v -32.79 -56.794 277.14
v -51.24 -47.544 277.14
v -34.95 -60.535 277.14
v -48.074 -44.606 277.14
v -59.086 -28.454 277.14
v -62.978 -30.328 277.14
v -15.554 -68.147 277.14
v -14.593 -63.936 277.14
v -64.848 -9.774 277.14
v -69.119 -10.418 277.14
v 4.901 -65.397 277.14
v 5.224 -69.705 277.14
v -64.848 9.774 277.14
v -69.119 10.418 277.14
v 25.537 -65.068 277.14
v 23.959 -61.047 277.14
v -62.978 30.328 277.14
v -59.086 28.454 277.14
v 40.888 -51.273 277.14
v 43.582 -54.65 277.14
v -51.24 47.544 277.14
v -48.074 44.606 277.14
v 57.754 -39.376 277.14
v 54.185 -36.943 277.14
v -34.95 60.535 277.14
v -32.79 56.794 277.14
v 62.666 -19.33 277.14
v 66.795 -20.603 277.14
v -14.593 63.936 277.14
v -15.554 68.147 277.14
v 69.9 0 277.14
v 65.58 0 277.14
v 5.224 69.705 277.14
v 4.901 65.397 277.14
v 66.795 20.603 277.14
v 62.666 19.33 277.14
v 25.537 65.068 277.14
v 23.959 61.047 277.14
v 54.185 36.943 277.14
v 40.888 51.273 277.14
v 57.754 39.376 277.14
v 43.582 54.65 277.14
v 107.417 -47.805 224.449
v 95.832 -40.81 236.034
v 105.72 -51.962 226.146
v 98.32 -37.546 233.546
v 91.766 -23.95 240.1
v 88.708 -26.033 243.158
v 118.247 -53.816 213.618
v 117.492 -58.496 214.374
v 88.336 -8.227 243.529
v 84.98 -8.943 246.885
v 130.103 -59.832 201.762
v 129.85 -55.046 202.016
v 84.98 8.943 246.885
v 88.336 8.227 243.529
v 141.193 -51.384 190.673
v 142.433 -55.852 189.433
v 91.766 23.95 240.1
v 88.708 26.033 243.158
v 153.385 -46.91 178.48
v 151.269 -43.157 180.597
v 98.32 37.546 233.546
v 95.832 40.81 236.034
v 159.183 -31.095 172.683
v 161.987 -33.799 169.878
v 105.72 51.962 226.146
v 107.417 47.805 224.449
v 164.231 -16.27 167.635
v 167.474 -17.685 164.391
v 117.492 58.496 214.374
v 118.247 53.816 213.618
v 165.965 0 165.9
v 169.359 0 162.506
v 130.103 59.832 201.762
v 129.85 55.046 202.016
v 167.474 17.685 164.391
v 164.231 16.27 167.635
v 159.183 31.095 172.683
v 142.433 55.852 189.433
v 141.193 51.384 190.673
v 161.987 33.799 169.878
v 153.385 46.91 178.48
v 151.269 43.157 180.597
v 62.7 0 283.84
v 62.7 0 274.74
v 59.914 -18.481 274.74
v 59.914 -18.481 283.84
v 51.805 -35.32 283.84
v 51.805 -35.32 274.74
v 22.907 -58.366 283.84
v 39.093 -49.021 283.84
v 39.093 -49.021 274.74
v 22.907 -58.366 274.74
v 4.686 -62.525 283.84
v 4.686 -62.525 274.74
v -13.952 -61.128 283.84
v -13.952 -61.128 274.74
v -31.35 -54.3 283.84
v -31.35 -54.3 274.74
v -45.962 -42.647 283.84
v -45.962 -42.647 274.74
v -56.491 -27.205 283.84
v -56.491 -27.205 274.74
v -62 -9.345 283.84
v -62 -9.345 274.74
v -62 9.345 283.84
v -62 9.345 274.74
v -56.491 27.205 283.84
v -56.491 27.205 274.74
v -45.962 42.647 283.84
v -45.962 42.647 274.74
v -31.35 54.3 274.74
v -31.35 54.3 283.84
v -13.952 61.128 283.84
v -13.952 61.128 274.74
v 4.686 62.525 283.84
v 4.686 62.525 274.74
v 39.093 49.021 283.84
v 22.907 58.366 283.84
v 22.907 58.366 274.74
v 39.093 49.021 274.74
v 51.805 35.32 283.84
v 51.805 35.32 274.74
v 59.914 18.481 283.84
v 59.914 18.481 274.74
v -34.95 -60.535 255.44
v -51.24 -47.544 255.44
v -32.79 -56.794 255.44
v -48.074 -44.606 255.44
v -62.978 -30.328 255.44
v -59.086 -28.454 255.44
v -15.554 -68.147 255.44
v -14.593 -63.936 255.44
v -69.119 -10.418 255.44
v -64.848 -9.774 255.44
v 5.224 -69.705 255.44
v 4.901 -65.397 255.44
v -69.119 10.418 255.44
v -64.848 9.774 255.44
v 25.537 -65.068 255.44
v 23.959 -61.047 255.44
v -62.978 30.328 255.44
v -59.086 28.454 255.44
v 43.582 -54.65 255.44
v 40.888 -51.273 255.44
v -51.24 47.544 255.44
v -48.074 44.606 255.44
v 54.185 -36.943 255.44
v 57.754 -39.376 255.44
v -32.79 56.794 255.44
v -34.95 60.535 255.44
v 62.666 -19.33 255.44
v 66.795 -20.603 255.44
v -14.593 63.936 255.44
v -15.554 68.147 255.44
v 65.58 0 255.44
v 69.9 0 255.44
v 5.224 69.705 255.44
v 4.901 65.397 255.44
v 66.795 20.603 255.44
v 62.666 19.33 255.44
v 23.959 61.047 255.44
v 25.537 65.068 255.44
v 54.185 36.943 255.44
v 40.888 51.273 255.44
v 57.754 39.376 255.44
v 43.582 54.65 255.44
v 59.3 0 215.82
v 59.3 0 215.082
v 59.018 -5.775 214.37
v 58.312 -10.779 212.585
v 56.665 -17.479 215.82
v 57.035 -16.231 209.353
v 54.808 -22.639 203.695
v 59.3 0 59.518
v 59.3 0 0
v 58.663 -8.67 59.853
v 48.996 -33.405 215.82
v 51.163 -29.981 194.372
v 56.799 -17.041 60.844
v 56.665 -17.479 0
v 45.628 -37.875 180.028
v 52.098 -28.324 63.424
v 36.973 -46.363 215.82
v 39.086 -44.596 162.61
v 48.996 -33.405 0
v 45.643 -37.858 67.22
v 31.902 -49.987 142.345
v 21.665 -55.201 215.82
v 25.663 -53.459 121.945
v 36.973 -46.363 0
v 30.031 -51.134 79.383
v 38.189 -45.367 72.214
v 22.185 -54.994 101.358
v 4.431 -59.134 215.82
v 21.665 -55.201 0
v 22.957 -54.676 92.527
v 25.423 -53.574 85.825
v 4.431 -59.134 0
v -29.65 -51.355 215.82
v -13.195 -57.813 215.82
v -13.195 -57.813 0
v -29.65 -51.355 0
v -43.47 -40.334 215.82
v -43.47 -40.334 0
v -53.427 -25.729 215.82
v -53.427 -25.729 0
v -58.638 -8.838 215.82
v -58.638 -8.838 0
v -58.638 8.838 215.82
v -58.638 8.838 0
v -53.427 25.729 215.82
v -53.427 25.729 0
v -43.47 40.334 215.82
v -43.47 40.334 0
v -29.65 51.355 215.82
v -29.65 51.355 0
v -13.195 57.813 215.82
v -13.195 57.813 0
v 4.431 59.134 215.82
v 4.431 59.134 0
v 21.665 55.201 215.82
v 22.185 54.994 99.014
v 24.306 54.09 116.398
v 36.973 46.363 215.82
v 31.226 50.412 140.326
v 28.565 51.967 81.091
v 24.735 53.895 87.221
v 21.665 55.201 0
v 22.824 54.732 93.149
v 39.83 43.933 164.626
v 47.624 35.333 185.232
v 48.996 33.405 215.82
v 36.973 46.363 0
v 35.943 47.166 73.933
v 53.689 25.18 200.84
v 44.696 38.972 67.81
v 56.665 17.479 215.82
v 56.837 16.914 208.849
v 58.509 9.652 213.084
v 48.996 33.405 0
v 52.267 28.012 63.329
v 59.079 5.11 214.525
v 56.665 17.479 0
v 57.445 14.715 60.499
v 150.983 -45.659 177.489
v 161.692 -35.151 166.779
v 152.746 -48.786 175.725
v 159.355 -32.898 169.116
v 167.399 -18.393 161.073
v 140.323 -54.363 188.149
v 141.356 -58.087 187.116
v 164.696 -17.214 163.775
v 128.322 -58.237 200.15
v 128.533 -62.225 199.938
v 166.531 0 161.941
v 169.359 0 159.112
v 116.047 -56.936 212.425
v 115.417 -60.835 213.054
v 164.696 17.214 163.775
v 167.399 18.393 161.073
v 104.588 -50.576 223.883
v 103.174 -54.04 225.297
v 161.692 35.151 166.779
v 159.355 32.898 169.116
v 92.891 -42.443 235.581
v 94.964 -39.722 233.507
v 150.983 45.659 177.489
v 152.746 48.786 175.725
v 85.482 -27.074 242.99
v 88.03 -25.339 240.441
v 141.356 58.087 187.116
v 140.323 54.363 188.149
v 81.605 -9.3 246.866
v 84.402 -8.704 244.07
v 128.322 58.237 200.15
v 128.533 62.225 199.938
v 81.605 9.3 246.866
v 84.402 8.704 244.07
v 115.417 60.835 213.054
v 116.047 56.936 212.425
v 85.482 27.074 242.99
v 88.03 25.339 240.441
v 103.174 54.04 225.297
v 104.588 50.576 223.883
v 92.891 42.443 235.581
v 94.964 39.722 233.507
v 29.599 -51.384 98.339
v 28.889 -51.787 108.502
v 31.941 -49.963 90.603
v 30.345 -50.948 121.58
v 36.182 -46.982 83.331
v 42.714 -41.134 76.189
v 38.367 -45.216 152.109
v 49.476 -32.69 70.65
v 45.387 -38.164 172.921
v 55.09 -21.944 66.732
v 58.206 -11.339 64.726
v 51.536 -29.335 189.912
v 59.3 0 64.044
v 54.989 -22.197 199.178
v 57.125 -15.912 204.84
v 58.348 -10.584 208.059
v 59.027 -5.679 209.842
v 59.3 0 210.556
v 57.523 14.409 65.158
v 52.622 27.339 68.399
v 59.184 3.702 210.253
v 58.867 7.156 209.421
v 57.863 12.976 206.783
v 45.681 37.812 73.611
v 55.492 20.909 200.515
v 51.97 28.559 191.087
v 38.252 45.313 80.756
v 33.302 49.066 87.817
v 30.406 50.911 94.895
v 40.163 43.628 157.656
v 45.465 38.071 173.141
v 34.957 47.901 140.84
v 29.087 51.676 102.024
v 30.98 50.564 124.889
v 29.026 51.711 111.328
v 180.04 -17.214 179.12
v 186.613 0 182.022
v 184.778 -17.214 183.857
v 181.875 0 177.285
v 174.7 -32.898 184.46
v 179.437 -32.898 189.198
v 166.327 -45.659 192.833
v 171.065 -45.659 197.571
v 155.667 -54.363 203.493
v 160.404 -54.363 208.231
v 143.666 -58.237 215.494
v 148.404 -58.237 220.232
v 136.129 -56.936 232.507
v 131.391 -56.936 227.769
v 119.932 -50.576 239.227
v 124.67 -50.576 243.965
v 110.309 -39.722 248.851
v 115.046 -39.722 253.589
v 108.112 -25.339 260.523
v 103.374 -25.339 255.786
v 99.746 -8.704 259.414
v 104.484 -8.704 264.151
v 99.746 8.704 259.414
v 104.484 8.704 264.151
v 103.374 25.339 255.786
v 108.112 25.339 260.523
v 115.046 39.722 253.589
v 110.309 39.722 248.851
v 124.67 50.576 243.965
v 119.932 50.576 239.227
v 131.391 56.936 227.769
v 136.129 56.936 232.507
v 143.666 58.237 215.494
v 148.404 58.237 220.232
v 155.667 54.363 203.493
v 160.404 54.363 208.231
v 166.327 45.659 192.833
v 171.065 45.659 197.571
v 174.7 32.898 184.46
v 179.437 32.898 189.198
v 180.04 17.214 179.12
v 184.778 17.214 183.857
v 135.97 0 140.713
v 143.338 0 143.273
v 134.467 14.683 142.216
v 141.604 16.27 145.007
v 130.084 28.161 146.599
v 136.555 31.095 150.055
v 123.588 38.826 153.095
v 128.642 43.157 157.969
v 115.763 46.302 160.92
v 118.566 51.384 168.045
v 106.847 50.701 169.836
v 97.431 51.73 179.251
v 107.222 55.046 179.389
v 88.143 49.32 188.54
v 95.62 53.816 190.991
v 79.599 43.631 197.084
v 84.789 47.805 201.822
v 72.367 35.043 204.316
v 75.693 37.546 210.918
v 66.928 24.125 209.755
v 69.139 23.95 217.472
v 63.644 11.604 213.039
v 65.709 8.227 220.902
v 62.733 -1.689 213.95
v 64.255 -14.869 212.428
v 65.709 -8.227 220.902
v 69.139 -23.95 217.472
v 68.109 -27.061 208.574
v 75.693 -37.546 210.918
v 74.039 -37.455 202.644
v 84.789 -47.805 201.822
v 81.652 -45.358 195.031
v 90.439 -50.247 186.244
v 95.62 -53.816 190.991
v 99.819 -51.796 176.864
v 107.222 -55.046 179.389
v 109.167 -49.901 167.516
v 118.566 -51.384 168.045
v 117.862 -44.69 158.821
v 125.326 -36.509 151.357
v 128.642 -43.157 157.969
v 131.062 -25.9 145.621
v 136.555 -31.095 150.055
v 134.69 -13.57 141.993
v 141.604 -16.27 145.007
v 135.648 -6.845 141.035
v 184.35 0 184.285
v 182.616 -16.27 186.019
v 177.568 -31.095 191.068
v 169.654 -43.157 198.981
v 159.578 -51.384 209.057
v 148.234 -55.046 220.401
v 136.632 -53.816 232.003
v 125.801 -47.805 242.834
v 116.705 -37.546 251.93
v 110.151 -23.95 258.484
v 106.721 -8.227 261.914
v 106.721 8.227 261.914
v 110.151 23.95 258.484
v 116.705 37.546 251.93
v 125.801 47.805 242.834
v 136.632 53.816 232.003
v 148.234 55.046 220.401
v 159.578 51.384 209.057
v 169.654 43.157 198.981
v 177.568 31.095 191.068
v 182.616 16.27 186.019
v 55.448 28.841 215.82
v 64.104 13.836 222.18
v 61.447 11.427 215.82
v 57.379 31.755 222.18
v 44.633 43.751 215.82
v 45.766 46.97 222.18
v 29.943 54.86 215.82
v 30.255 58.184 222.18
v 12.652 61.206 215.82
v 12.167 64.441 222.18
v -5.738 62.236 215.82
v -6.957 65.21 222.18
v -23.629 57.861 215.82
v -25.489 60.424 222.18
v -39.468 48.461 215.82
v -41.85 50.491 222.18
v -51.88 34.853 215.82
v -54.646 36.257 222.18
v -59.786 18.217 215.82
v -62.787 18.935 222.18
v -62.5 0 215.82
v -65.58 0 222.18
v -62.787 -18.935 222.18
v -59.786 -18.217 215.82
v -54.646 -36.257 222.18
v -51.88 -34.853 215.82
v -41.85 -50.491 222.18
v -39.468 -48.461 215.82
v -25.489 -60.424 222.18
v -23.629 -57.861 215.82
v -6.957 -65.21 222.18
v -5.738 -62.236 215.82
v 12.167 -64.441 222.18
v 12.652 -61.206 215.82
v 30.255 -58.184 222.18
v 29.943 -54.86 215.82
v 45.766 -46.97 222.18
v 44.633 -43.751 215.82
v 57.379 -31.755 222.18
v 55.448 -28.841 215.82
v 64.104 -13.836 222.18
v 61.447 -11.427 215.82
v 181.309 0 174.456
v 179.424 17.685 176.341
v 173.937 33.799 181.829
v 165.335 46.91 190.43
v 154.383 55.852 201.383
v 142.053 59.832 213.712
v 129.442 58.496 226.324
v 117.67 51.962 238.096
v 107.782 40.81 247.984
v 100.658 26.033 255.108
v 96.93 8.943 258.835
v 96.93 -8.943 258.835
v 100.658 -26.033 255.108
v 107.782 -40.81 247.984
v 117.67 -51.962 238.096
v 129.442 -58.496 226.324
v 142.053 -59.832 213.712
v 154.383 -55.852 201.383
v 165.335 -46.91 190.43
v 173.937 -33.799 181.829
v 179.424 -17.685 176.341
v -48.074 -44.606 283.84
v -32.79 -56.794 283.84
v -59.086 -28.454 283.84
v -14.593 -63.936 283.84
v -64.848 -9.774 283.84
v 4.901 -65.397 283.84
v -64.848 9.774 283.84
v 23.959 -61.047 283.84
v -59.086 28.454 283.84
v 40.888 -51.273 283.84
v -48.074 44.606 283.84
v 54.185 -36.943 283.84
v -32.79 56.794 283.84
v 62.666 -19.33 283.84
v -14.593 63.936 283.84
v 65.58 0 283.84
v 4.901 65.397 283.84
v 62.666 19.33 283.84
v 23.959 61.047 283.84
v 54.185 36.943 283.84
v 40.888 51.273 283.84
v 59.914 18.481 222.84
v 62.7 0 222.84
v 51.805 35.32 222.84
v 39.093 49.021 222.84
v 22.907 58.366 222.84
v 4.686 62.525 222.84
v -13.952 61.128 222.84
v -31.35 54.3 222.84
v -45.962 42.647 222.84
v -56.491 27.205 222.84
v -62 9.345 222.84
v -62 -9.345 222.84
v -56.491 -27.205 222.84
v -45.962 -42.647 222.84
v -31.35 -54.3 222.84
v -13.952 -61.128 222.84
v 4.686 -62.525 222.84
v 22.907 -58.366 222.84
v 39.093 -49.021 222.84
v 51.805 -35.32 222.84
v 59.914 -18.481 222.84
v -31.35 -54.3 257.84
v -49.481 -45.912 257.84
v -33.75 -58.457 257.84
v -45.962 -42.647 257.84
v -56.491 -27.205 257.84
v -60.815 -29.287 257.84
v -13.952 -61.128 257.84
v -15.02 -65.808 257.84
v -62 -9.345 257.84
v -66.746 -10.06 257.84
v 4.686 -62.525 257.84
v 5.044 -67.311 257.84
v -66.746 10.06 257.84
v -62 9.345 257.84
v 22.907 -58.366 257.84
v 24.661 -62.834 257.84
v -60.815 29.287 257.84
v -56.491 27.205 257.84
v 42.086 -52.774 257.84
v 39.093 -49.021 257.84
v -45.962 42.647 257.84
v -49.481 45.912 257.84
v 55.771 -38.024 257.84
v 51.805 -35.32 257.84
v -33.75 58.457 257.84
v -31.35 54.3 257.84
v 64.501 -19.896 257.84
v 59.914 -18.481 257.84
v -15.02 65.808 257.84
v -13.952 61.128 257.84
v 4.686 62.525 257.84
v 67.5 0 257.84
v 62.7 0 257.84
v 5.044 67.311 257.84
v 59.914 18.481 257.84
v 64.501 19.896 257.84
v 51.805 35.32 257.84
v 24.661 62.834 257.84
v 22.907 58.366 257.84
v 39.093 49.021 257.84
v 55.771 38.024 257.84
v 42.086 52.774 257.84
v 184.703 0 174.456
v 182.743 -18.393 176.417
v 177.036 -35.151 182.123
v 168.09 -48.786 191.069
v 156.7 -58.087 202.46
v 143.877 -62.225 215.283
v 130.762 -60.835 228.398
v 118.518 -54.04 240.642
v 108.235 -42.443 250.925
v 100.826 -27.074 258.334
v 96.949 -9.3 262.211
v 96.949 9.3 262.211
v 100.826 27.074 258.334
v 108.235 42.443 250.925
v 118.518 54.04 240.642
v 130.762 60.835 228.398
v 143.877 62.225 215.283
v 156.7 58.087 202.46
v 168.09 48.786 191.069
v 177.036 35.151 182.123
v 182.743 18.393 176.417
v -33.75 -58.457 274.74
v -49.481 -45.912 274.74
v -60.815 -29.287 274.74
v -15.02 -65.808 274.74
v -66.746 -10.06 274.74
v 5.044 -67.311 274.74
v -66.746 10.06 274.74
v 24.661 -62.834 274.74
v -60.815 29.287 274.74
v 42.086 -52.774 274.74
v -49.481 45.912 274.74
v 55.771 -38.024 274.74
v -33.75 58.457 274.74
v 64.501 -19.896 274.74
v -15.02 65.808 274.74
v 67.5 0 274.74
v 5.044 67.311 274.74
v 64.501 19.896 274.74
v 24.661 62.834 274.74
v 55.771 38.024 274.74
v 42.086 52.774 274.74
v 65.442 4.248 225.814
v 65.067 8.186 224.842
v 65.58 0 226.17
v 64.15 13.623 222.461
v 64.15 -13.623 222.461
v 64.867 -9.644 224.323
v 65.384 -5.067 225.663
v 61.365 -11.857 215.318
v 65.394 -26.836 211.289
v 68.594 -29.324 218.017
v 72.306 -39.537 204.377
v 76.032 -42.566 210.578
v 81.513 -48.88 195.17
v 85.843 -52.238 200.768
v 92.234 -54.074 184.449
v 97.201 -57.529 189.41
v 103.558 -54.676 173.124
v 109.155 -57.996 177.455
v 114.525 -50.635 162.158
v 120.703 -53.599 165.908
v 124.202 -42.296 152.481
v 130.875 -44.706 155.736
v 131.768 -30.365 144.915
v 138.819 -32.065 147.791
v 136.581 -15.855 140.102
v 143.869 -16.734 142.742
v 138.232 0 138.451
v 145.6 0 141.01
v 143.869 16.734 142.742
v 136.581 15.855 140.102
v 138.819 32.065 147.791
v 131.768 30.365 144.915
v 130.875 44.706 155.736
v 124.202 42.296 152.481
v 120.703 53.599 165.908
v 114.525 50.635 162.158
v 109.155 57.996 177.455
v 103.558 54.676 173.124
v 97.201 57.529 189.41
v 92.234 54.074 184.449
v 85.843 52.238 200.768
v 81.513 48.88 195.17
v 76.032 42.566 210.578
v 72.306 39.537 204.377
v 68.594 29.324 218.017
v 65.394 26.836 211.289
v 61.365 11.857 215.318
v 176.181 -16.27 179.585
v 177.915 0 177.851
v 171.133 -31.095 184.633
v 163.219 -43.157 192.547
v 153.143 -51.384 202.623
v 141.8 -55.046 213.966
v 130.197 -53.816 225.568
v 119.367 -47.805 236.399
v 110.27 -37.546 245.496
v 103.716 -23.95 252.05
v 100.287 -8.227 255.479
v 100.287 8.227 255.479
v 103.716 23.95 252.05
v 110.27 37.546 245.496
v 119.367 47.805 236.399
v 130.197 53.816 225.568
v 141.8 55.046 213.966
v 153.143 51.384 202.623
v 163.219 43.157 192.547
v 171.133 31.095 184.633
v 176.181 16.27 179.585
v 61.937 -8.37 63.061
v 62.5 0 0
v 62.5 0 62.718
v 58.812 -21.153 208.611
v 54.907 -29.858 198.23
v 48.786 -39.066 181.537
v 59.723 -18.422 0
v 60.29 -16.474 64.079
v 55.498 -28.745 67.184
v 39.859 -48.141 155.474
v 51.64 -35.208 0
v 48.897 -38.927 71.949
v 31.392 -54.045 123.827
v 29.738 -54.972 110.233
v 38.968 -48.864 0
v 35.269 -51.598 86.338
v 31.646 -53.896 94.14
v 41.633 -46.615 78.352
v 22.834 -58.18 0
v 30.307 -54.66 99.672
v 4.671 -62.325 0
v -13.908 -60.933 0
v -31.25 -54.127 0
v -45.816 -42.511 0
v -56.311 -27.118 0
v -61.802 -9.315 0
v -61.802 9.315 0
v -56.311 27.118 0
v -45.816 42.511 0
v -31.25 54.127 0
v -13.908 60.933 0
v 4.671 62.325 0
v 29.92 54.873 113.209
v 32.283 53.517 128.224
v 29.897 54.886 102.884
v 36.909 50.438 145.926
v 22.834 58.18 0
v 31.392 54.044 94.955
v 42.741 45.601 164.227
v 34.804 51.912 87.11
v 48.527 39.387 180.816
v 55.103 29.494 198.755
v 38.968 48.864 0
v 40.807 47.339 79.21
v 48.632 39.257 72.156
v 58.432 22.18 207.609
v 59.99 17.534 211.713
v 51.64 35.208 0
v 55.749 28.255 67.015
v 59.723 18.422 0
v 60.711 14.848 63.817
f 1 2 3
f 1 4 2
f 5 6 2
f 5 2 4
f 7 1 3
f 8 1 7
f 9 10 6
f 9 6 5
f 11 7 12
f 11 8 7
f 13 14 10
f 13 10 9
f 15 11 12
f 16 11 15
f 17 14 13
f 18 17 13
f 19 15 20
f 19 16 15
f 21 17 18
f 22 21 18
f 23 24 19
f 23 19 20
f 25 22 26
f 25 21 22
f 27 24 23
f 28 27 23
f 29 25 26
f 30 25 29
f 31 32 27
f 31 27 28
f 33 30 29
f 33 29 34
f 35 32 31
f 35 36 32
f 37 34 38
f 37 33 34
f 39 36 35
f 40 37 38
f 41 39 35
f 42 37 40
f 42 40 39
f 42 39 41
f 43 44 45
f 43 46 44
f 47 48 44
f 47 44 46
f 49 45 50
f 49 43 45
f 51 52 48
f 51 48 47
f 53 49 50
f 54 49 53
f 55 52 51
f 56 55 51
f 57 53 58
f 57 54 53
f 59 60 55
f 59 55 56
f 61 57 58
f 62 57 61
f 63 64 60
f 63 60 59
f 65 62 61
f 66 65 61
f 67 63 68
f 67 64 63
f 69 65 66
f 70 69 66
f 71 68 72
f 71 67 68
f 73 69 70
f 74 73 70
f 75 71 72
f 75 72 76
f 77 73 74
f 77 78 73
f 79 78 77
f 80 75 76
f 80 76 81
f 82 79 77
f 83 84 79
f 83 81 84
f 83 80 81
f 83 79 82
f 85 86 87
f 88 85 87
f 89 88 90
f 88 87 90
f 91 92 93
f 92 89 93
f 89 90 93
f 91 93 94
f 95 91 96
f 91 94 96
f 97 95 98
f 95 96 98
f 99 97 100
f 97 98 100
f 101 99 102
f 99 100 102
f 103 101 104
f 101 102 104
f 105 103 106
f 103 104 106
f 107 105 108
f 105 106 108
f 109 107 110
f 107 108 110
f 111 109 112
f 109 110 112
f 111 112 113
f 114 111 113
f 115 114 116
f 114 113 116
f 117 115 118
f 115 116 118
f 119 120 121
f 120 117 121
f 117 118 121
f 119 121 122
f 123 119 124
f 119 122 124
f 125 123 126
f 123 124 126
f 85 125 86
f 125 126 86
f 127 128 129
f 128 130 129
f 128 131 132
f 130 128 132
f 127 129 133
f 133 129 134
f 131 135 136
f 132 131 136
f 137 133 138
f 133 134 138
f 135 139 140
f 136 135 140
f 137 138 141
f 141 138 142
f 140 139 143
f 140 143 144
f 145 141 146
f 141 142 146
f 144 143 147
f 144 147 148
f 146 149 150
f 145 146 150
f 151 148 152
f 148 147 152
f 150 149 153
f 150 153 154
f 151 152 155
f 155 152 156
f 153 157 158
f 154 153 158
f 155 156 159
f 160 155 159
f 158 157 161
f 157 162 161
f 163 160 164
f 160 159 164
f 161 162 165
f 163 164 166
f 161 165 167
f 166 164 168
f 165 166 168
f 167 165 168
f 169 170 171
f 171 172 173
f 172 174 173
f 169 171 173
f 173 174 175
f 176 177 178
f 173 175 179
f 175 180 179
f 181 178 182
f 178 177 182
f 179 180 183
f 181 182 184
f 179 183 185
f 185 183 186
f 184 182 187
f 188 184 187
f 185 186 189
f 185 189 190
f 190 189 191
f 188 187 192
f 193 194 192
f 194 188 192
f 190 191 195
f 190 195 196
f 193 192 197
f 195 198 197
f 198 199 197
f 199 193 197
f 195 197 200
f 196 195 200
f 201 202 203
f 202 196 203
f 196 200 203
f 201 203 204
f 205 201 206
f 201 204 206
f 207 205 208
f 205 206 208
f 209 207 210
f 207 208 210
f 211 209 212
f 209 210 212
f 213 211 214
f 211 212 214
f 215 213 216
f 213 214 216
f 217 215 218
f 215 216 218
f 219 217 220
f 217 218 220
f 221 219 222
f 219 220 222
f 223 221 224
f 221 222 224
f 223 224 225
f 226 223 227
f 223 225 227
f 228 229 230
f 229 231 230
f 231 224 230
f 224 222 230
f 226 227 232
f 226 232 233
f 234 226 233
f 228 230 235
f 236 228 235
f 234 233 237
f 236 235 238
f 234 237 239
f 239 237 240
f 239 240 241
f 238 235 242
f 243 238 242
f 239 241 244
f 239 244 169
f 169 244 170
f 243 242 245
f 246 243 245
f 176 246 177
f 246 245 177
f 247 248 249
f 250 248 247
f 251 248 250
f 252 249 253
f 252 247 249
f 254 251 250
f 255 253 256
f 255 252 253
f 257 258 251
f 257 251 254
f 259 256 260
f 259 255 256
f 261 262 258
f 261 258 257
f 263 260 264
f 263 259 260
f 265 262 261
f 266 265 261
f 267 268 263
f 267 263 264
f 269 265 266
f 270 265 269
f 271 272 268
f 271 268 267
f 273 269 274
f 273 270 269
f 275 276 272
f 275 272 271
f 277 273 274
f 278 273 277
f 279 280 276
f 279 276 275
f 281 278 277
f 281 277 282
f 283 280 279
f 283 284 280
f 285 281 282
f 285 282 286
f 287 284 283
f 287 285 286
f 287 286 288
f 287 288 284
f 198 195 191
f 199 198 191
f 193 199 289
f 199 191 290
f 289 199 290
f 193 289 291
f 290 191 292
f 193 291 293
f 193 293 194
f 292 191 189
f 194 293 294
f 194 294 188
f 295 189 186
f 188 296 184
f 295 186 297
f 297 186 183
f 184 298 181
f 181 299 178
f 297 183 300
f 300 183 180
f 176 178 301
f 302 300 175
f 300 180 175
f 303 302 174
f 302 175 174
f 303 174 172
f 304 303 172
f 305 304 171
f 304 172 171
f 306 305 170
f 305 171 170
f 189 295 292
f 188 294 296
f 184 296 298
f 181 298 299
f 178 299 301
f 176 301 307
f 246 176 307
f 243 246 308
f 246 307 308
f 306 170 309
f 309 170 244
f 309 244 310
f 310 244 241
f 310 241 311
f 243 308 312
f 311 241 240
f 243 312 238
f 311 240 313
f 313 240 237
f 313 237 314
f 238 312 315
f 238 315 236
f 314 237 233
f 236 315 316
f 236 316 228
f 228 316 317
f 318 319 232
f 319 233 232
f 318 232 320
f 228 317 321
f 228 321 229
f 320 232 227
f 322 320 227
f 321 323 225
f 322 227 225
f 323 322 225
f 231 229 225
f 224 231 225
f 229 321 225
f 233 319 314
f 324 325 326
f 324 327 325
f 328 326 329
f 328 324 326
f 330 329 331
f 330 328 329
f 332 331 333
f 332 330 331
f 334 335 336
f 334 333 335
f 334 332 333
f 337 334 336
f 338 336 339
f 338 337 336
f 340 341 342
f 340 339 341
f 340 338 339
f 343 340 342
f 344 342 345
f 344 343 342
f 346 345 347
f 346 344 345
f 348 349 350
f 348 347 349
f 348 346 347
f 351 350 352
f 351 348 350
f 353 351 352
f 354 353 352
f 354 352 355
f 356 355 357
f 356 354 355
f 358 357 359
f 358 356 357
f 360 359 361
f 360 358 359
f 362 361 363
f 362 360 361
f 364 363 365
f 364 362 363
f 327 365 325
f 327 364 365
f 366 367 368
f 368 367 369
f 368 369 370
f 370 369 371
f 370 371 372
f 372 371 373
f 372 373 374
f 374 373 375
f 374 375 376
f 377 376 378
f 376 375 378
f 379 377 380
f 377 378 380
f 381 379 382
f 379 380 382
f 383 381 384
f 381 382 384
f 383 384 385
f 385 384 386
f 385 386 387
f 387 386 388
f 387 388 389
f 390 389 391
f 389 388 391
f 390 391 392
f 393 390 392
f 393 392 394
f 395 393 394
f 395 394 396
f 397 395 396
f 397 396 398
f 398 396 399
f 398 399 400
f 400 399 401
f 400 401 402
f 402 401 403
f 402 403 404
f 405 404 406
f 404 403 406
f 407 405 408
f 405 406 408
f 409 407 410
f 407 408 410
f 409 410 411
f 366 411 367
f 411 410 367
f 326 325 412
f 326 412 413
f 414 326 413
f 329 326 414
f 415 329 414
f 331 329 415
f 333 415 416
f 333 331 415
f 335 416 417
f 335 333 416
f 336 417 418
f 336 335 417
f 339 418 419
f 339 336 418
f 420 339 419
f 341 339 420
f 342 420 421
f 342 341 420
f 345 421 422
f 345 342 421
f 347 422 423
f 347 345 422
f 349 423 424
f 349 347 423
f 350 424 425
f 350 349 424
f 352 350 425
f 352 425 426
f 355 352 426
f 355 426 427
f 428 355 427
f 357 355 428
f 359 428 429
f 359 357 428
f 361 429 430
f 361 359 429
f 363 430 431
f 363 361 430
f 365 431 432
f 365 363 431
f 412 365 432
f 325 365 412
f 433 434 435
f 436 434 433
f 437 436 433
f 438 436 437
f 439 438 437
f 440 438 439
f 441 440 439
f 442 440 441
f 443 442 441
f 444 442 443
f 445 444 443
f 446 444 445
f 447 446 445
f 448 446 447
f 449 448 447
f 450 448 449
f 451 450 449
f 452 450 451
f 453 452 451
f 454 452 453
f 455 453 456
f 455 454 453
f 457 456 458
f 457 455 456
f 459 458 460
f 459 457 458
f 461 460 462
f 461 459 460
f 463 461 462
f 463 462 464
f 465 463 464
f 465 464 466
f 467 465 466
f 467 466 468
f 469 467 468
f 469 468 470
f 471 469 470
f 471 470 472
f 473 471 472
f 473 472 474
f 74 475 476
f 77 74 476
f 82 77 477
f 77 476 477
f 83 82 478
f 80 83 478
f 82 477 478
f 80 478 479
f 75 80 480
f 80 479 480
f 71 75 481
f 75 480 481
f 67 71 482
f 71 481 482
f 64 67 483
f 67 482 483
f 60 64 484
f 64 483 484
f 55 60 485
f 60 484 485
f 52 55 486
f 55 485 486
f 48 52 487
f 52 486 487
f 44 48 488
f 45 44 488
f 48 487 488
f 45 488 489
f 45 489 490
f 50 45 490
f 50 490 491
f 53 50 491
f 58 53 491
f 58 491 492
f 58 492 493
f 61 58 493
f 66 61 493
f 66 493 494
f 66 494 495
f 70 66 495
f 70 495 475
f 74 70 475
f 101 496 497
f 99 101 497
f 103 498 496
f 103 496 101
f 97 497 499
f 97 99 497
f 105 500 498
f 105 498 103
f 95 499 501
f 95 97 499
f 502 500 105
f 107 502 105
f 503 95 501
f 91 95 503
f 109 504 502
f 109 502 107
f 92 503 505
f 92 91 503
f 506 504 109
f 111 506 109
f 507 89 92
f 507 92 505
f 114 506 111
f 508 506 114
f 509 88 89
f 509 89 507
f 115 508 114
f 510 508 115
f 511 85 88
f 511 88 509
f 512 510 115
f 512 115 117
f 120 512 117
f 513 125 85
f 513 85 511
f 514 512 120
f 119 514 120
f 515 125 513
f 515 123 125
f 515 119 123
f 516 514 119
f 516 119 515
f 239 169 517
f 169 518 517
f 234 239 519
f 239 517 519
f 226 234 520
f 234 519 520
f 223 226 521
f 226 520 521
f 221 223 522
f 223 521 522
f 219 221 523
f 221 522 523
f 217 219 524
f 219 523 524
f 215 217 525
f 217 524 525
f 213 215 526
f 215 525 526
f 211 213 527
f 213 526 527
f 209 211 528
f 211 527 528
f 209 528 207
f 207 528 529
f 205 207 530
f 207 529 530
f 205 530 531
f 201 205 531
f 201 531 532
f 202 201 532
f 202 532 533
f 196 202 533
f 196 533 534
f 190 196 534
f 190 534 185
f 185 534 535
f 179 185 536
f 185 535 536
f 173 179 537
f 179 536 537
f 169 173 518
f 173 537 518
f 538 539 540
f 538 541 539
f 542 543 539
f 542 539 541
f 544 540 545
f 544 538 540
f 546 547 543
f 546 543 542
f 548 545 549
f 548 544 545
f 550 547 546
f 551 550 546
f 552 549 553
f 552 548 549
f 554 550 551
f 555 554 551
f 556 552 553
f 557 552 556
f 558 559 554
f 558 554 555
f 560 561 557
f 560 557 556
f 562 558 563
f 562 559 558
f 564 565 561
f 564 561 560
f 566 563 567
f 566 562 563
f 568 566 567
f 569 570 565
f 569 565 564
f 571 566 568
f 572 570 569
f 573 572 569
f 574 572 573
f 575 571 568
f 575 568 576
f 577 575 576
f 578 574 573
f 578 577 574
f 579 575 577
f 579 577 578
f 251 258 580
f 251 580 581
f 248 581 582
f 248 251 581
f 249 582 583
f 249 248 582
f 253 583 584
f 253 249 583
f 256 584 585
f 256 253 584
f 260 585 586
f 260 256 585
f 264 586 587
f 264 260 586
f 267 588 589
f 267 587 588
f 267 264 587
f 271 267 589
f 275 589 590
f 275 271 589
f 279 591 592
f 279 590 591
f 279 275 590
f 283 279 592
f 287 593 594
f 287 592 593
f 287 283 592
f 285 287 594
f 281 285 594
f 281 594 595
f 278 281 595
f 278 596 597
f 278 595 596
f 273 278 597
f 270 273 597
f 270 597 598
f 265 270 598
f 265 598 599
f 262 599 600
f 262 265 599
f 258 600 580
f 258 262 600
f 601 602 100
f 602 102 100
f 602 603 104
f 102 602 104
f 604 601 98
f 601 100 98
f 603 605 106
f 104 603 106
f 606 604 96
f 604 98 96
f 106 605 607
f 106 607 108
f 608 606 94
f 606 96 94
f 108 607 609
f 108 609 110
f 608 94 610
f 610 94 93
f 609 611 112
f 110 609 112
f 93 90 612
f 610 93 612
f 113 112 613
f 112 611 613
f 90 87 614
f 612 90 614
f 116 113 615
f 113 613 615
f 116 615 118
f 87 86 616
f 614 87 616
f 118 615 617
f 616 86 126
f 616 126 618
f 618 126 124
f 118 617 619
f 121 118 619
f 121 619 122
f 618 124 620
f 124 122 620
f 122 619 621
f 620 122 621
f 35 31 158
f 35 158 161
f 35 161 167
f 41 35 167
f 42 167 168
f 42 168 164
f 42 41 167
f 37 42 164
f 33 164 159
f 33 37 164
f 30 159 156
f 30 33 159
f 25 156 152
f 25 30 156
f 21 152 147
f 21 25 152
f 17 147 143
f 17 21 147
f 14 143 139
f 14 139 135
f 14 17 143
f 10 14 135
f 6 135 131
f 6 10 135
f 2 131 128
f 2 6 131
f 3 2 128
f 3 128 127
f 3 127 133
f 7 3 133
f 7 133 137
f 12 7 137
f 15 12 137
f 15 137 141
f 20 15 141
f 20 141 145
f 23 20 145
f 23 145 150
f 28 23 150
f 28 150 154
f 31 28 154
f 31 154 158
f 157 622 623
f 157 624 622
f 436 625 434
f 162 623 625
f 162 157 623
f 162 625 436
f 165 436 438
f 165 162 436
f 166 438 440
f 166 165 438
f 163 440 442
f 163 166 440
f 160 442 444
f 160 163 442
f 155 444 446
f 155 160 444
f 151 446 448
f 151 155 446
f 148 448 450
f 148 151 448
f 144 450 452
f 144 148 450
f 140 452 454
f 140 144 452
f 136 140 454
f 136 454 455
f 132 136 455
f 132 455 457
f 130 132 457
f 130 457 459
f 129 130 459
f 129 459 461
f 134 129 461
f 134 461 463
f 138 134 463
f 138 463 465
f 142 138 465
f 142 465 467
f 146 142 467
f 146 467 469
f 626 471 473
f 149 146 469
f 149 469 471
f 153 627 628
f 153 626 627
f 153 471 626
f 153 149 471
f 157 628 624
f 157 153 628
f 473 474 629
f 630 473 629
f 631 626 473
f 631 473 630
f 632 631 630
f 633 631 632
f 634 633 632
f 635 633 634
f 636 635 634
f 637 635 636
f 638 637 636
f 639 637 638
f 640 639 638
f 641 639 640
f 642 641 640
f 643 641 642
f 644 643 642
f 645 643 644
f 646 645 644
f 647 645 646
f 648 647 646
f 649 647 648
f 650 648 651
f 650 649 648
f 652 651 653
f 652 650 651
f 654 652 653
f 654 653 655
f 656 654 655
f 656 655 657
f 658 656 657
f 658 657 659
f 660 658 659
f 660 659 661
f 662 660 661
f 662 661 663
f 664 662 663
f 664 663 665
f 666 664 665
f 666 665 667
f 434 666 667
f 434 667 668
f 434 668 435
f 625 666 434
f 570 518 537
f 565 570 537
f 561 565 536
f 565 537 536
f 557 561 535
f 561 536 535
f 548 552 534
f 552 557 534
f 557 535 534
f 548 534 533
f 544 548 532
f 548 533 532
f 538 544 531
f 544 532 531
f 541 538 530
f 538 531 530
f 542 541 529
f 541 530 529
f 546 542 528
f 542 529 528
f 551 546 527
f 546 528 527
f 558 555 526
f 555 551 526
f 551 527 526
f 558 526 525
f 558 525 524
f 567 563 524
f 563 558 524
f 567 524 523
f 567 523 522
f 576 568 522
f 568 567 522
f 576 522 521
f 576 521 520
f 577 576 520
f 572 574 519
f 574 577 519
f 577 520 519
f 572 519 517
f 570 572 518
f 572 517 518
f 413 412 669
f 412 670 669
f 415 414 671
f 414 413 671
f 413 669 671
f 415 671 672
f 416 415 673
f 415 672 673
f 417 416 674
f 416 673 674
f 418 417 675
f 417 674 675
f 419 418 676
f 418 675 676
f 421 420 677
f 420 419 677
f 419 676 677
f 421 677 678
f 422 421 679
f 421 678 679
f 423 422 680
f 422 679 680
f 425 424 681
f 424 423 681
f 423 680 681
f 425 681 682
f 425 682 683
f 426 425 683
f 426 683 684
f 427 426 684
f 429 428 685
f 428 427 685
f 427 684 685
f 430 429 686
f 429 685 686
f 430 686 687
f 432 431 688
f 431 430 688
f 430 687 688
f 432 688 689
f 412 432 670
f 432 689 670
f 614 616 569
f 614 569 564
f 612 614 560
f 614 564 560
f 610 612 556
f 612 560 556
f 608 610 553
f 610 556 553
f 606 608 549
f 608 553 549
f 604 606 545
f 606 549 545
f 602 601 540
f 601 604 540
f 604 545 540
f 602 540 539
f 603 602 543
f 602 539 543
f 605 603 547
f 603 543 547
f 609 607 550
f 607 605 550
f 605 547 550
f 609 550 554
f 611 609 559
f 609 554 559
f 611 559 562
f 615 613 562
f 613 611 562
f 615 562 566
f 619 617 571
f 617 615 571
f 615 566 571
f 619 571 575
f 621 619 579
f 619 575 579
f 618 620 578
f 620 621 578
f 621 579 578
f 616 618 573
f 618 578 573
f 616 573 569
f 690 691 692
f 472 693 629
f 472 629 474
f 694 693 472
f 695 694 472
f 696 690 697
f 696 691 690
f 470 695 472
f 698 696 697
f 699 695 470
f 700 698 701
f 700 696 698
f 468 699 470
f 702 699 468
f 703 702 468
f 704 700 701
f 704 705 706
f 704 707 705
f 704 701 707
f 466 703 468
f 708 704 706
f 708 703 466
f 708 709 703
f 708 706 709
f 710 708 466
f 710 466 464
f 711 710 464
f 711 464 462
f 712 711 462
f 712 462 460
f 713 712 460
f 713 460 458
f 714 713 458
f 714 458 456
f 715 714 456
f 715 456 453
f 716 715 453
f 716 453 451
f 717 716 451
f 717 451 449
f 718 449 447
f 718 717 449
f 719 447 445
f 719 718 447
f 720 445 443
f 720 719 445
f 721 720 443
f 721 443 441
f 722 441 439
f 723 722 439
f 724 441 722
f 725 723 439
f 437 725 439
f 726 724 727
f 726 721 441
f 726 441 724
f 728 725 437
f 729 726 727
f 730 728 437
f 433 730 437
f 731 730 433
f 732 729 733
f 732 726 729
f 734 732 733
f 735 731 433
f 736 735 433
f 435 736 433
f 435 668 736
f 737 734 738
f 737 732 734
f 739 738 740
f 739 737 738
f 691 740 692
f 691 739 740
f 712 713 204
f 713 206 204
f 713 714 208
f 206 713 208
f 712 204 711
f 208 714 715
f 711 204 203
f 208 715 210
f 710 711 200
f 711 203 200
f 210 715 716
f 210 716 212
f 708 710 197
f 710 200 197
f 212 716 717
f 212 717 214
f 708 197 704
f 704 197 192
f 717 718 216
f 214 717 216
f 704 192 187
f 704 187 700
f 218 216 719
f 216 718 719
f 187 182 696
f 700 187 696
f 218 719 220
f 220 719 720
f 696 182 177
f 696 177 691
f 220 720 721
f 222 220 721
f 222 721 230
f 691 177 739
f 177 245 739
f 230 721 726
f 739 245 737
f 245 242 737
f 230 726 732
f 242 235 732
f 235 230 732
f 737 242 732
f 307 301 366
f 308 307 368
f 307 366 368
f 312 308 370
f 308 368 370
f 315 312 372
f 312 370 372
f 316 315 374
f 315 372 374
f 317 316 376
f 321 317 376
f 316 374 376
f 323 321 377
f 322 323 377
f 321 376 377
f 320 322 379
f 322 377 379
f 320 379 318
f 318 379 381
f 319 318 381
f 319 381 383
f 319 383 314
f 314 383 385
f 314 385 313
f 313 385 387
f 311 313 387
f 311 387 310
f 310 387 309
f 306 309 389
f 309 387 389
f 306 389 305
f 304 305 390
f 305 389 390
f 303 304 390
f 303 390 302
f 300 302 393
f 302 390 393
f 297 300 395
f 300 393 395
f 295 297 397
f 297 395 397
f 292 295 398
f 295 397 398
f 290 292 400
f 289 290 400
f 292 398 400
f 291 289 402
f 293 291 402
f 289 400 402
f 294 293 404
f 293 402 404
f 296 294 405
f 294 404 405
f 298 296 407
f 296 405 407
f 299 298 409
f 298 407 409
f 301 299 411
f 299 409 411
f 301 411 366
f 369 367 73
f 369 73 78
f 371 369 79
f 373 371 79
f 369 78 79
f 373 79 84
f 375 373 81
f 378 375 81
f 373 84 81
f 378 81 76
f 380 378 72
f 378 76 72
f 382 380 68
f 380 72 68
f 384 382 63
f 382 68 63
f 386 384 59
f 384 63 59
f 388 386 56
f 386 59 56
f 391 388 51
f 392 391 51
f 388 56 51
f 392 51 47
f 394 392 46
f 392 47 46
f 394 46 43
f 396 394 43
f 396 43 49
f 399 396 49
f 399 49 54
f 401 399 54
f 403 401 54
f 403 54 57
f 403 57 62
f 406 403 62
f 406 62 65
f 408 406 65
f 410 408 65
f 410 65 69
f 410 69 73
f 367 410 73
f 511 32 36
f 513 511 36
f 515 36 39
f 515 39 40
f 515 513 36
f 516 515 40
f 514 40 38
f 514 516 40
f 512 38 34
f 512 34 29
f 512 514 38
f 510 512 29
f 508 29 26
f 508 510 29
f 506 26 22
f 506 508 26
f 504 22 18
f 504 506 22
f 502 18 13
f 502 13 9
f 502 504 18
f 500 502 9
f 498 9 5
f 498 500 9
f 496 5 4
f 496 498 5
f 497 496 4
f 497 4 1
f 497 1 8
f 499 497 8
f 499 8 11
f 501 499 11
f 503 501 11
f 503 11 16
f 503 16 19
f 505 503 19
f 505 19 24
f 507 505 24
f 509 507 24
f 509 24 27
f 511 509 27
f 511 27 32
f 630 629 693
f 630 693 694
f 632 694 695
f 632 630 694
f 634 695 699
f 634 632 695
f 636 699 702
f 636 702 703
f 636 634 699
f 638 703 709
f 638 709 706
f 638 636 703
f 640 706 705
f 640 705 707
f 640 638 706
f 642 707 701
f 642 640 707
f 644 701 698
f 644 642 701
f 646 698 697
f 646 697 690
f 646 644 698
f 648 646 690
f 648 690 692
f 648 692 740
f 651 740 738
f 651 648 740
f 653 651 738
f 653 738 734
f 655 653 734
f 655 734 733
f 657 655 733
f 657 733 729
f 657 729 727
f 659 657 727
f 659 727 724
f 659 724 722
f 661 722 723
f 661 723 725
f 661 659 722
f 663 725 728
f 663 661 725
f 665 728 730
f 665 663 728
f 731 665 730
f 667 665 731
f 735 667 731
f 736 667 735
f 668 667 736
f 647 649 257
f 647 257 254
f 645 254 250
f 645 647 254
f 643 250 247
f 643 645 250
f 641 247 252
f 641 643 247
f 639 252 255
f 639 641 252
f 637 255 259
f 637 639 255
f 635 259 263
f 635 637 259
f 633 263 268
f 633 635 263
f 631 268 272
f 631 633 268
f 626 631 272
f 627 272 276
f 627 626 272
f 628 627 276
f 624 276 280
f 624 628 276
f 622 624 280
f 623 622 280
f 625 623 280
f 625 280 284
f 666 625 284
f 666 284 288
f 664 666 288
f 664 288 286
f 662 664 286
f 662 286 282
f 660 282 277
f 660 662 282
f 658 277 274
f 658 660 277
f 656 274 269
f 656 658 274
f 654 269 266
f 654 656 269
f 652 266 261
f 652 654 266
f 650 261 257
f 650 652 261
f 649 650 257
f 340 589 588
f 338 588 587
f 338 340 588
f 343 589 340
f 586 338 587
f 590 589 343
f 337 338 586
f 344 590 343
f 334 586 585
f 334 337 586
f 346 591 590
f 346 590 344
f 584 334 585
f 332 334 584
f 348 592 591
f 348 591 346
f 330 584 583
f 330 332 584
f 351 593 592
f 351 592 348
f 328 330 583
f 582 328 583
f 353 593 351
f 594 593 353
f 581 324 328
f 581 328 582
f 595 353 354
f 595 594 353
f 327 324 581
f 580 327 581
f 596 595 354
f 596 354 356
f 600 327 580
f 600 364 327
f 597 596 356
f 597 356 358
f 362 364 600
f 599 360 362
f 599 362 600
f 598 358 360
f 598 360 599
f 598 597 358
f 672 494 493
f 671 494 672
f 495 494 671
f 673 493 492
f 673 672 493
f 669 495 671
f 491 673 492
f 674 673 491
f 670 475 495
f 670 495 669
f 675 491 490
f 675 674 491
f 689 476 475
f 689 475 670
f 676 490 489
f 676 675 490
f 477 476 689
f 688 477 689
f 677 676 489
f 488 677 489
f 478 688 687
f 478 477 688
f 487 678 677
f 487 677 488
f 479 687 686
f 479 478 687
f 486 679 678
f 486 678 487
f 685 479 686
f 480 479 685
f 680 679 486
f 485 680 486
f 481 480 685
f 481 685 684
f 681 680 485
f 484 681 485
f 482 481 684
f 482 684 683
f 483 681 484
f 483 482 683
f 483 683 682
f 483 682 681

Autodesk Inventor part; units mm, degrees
ref_plane "YZ Plane" through (0, 0, 0) normal (1, 0, 0) x (0, 1, 0)
ref_plane "XZ Plane" through (0, 0, 0) normal (0, 1, 0) x (-1, 0, 0)
ref_plane "XY Plane" through (0, 0, 0) normal (0, 0, 1) x (1, 0, 0)
sketch "Sketch1" plane through (0, 0, 0) normal (0, 1, 0) x (-1, 0, 0)
  line L0 (0, 0) -> (0, 283.8404)
  line L1 (-65.58, 222.1797) -> (-62.5, 215.8203)
  line L2 (-65.58, 283.8404) -> (-62.7, 283.8404)
  line L3 (-62.7, 222.8404) -> (-59.3, 215.8203)
  line L4 (0, 0) -> (-62.5, 0) construction
  line L5 (-59.3, 215.8203) -> (-59.3, 0)
  line L6 (-62.5, 215.8203) -> (-62.5, 0)
  line L7 (-59.3, 0) -> (-62.5, 0)
  line L8 (-62.7, 283.8404) -> (0, 283.8404) construction
  line L9 (-62.5, 0) -> (-59.3, 0)
  line L10 (-64.04, 219) -> (0, 219) construction
  line L11 (0, 78) -> (-62.5, 78) construction
  line L12 (0, 60) -> (-62.5, 60) construction
  line L13 (0, 78) -> (-145.3176, 223.3176)
  line L14 (0, 78) -> (-36.6281, 41.3719) construction
  line L15 (-36.6281, 41.3719) -> (-135.9695, 140.7133)
  line L16 (-36.6281, 41.3719) -> (-38.8909, 39.1091) construction
  line L17 (-38.8909, 39.1091) -> (-138.2323, 138.4505)
  line L18 (-36.6281, 41.3719) -> (-38.8909, 39.1091)
  line L19 (-135.9695, 140.7133) -> (-143.3377, 143.2731)
  line L20 (-184.3499, 184.2853) -> (-186.6126, 182.0225)
  line L21 (-145.6004, 141.0103) -> (-138.2323, 138.4505)
  line L22 (-141.9163, 139.7304) -> (-101.8234, 179.8234) construction
  line L23 (-65.58, 222.1797) -> (-65.58, 255.4404)
  line L24 (-65.58, 255.4404) -> (-69.9, 255.4404)
  line L25 (-69.9, 255.4404) -> (-69.9, 277.1404)
  line L26 (-69.9, 277.1404) -> (-65.58, 277.1404)
  line L27 (-65.58, 277.1404) -> (-65.58, 283.8404)
  line L28 (-62.7, 283.8404) -> (-62.7, 274.7404)
  line L29 (-62.7, 274.7404) -> (-67.5, 274.7404)
  line L30 (-67.5, 274.7404) -> (-67.5, 257.8404)
  line L31 (-67.5, 257.8404) -> (-62.7, 257.8404)
  line L32 (-62.7, 257.8404) -> (-62.7, 222.8404)
  line L33 (-143.3377, 143.2731) -> (-165.9651, 165.9005)
  line L34 (-165.9651, 165.9005) -> (-169.3592, 162.5064)
  line L35 (-169.3592, 162.5064) -> (-181.3093, 174.4565)
  line L36 (-181.3093, 174.4565) -> (-177.9152, 177.8506)
  line L37 (-184.3499, 184.2853) -> (-177.9152, 177.8506)
  line L38 (-186.6126, 182.0225) -> (-181.875, 177.2849)
  line L39 (-181.875, 177.2849) -> (-184.7034, 174.4565)
  line L40 (-184.7034, 174.4565) -> (-169.3592, 159.1123)
  line L41 (-169.3592, 159.1123) -> (-166.5308, 161.9407)
  line L42 (-166.5308, 161.9407) -> (-145.6004, 141.0103)
  line L43 (-184.3499, 184.2853) -> (-145.3176, 223.3176) construction
  line L44 (-135.9695, 140.7133) -> (-99.3414, 177.3414) construction
  line L45 (-143.3377, 143.2731) -> (-104.3054, 182.3054) construction
  line L46 (-62.5, 215.8203) -> (-59.3, 215.8203) construction
  line L47 (-62.7, 222.8404) -> (0, 222.8404) construction
  dimension "d0" = 125
  dimension "d1" = 3.2
  dimension "d2" = 60
  dimension "d3" = 18
  dimension "d4" = 141
  dimension "d5" = 45
  dimension "d6" = 110
  dimension "d7" = 3.2
  dimension "d8" = 144
  dimension "d12" = 125.4
  dimension "d13" = 2.4
  dimension "d14" = 2.4
  dimension "d15" = 2.4
  dimension "d16" = 26
  dimension "d17" = 7.2
  dimension "d18" = 2.88
  dimension "d19" = 2.4
  dimension "d20" = 2.4
  dimension "d21" = 2.4
  dimension "d22" = 7.2
  dimension "d23" = 26
  dimension "d24" = 110.4
  dimension "d25" = 9.1
  dimension "d26" = 2.88
  dimension "d27" = 35
  dimension "d28" = 2.88
  dimension "d29" = 9.1
  dimension "d30" = 32
revolve "Revolution1" add sketch "Sketch1" angle 360 about axis through (0, 0, 0) along (0, 0, 1) contours L23 L24 L25 L26 L27 L2 L28 L29 L30 L31 L32 L3 L5 L13 L6 L1 | L13 L5 L15 L6 | L15 L5 L17 L6 | L17 L5 L7 L6
revolve "Revolution2" add sketch "Sketch1" angle 360 about axis through (0, 0, 78) along (0.7071, 0, 0.7071) contours L15 L5 L17 L6 | L6 L17 L21 L42 L41 L40 L39 L38 L20 L37 L36 L35 L34 L33 L19 L15 | L15 L18 L17 L5
sketch "Sketch2" plane through (145.3176, 0, 223.3176) normal (0.7071, 0, 0.7071) x (0.7071, 0, -0.7071)
  circle A0 centre (0, 0) radius 55.2 projected
  circle A1 centre (0, 0) radius 51.8
  arc A2 (-16.8261, -2.4255) -> (-16.8261, 2.4255) centre (0, 0) ccw projected
sketch "Sketch3" plane through (0, 0, 283.8404) normal (0, 0, 1) x (1, 0, 0)
  circle A0 centre (0, 0) radius 62.7 projected
  circle A1 centre (0, 0) radius 59.3
  arc A2 (34.4837, 1.0611) -> (34.4837, -1.0611) centre (0, 0) ccw projected
extrude "Extrusion1" cut sketch "Sketch3" against normal through all contours A1
extrude "Extrusion2" cut sketch "Sketch2" against normal up to surface contours A1
equation "\"d0\" = De"
equation "\"d2\" = L1"
equation "\"d3\" = z1"
equation "\"d12\" = Ds"
equation "\"d13\" = e3"
equation "\"d10\" = L1 + z2"
equation "\"De\" = 125"
equation "\"Ds\" = 125.4"
equation "\"L1\" = 60"
equation "\"e\" = 3.2"
equation "\"z1\" = 18"
equation "\"z2\" = 144"
equation "\"z3\" = 141"
equation "\"e2\" = 0.9 * e"
equation "\"e3\" = 0.75 * e"
equation "\"A\" = 35"
equation "\"C1\" = 26"
equation "\"C2\" = 26"
equation "\"A1\" = 32"
equation "\"e1\" = 3.2"
equation "\"e12\" = 2.88"
equation "\"e13\" = 2.4"
equation "\"L2\" = 54"
equation "\"Ds1\" = 110.4"
equation "\"Size_Designation\" = 1.2345"
properties part number "ISO 3633 45 Deg Reducing Branch with Single Socket for Elastomeric Sealing Ring Joints DN125 x DN110" material "PVC, Unplasticized"
